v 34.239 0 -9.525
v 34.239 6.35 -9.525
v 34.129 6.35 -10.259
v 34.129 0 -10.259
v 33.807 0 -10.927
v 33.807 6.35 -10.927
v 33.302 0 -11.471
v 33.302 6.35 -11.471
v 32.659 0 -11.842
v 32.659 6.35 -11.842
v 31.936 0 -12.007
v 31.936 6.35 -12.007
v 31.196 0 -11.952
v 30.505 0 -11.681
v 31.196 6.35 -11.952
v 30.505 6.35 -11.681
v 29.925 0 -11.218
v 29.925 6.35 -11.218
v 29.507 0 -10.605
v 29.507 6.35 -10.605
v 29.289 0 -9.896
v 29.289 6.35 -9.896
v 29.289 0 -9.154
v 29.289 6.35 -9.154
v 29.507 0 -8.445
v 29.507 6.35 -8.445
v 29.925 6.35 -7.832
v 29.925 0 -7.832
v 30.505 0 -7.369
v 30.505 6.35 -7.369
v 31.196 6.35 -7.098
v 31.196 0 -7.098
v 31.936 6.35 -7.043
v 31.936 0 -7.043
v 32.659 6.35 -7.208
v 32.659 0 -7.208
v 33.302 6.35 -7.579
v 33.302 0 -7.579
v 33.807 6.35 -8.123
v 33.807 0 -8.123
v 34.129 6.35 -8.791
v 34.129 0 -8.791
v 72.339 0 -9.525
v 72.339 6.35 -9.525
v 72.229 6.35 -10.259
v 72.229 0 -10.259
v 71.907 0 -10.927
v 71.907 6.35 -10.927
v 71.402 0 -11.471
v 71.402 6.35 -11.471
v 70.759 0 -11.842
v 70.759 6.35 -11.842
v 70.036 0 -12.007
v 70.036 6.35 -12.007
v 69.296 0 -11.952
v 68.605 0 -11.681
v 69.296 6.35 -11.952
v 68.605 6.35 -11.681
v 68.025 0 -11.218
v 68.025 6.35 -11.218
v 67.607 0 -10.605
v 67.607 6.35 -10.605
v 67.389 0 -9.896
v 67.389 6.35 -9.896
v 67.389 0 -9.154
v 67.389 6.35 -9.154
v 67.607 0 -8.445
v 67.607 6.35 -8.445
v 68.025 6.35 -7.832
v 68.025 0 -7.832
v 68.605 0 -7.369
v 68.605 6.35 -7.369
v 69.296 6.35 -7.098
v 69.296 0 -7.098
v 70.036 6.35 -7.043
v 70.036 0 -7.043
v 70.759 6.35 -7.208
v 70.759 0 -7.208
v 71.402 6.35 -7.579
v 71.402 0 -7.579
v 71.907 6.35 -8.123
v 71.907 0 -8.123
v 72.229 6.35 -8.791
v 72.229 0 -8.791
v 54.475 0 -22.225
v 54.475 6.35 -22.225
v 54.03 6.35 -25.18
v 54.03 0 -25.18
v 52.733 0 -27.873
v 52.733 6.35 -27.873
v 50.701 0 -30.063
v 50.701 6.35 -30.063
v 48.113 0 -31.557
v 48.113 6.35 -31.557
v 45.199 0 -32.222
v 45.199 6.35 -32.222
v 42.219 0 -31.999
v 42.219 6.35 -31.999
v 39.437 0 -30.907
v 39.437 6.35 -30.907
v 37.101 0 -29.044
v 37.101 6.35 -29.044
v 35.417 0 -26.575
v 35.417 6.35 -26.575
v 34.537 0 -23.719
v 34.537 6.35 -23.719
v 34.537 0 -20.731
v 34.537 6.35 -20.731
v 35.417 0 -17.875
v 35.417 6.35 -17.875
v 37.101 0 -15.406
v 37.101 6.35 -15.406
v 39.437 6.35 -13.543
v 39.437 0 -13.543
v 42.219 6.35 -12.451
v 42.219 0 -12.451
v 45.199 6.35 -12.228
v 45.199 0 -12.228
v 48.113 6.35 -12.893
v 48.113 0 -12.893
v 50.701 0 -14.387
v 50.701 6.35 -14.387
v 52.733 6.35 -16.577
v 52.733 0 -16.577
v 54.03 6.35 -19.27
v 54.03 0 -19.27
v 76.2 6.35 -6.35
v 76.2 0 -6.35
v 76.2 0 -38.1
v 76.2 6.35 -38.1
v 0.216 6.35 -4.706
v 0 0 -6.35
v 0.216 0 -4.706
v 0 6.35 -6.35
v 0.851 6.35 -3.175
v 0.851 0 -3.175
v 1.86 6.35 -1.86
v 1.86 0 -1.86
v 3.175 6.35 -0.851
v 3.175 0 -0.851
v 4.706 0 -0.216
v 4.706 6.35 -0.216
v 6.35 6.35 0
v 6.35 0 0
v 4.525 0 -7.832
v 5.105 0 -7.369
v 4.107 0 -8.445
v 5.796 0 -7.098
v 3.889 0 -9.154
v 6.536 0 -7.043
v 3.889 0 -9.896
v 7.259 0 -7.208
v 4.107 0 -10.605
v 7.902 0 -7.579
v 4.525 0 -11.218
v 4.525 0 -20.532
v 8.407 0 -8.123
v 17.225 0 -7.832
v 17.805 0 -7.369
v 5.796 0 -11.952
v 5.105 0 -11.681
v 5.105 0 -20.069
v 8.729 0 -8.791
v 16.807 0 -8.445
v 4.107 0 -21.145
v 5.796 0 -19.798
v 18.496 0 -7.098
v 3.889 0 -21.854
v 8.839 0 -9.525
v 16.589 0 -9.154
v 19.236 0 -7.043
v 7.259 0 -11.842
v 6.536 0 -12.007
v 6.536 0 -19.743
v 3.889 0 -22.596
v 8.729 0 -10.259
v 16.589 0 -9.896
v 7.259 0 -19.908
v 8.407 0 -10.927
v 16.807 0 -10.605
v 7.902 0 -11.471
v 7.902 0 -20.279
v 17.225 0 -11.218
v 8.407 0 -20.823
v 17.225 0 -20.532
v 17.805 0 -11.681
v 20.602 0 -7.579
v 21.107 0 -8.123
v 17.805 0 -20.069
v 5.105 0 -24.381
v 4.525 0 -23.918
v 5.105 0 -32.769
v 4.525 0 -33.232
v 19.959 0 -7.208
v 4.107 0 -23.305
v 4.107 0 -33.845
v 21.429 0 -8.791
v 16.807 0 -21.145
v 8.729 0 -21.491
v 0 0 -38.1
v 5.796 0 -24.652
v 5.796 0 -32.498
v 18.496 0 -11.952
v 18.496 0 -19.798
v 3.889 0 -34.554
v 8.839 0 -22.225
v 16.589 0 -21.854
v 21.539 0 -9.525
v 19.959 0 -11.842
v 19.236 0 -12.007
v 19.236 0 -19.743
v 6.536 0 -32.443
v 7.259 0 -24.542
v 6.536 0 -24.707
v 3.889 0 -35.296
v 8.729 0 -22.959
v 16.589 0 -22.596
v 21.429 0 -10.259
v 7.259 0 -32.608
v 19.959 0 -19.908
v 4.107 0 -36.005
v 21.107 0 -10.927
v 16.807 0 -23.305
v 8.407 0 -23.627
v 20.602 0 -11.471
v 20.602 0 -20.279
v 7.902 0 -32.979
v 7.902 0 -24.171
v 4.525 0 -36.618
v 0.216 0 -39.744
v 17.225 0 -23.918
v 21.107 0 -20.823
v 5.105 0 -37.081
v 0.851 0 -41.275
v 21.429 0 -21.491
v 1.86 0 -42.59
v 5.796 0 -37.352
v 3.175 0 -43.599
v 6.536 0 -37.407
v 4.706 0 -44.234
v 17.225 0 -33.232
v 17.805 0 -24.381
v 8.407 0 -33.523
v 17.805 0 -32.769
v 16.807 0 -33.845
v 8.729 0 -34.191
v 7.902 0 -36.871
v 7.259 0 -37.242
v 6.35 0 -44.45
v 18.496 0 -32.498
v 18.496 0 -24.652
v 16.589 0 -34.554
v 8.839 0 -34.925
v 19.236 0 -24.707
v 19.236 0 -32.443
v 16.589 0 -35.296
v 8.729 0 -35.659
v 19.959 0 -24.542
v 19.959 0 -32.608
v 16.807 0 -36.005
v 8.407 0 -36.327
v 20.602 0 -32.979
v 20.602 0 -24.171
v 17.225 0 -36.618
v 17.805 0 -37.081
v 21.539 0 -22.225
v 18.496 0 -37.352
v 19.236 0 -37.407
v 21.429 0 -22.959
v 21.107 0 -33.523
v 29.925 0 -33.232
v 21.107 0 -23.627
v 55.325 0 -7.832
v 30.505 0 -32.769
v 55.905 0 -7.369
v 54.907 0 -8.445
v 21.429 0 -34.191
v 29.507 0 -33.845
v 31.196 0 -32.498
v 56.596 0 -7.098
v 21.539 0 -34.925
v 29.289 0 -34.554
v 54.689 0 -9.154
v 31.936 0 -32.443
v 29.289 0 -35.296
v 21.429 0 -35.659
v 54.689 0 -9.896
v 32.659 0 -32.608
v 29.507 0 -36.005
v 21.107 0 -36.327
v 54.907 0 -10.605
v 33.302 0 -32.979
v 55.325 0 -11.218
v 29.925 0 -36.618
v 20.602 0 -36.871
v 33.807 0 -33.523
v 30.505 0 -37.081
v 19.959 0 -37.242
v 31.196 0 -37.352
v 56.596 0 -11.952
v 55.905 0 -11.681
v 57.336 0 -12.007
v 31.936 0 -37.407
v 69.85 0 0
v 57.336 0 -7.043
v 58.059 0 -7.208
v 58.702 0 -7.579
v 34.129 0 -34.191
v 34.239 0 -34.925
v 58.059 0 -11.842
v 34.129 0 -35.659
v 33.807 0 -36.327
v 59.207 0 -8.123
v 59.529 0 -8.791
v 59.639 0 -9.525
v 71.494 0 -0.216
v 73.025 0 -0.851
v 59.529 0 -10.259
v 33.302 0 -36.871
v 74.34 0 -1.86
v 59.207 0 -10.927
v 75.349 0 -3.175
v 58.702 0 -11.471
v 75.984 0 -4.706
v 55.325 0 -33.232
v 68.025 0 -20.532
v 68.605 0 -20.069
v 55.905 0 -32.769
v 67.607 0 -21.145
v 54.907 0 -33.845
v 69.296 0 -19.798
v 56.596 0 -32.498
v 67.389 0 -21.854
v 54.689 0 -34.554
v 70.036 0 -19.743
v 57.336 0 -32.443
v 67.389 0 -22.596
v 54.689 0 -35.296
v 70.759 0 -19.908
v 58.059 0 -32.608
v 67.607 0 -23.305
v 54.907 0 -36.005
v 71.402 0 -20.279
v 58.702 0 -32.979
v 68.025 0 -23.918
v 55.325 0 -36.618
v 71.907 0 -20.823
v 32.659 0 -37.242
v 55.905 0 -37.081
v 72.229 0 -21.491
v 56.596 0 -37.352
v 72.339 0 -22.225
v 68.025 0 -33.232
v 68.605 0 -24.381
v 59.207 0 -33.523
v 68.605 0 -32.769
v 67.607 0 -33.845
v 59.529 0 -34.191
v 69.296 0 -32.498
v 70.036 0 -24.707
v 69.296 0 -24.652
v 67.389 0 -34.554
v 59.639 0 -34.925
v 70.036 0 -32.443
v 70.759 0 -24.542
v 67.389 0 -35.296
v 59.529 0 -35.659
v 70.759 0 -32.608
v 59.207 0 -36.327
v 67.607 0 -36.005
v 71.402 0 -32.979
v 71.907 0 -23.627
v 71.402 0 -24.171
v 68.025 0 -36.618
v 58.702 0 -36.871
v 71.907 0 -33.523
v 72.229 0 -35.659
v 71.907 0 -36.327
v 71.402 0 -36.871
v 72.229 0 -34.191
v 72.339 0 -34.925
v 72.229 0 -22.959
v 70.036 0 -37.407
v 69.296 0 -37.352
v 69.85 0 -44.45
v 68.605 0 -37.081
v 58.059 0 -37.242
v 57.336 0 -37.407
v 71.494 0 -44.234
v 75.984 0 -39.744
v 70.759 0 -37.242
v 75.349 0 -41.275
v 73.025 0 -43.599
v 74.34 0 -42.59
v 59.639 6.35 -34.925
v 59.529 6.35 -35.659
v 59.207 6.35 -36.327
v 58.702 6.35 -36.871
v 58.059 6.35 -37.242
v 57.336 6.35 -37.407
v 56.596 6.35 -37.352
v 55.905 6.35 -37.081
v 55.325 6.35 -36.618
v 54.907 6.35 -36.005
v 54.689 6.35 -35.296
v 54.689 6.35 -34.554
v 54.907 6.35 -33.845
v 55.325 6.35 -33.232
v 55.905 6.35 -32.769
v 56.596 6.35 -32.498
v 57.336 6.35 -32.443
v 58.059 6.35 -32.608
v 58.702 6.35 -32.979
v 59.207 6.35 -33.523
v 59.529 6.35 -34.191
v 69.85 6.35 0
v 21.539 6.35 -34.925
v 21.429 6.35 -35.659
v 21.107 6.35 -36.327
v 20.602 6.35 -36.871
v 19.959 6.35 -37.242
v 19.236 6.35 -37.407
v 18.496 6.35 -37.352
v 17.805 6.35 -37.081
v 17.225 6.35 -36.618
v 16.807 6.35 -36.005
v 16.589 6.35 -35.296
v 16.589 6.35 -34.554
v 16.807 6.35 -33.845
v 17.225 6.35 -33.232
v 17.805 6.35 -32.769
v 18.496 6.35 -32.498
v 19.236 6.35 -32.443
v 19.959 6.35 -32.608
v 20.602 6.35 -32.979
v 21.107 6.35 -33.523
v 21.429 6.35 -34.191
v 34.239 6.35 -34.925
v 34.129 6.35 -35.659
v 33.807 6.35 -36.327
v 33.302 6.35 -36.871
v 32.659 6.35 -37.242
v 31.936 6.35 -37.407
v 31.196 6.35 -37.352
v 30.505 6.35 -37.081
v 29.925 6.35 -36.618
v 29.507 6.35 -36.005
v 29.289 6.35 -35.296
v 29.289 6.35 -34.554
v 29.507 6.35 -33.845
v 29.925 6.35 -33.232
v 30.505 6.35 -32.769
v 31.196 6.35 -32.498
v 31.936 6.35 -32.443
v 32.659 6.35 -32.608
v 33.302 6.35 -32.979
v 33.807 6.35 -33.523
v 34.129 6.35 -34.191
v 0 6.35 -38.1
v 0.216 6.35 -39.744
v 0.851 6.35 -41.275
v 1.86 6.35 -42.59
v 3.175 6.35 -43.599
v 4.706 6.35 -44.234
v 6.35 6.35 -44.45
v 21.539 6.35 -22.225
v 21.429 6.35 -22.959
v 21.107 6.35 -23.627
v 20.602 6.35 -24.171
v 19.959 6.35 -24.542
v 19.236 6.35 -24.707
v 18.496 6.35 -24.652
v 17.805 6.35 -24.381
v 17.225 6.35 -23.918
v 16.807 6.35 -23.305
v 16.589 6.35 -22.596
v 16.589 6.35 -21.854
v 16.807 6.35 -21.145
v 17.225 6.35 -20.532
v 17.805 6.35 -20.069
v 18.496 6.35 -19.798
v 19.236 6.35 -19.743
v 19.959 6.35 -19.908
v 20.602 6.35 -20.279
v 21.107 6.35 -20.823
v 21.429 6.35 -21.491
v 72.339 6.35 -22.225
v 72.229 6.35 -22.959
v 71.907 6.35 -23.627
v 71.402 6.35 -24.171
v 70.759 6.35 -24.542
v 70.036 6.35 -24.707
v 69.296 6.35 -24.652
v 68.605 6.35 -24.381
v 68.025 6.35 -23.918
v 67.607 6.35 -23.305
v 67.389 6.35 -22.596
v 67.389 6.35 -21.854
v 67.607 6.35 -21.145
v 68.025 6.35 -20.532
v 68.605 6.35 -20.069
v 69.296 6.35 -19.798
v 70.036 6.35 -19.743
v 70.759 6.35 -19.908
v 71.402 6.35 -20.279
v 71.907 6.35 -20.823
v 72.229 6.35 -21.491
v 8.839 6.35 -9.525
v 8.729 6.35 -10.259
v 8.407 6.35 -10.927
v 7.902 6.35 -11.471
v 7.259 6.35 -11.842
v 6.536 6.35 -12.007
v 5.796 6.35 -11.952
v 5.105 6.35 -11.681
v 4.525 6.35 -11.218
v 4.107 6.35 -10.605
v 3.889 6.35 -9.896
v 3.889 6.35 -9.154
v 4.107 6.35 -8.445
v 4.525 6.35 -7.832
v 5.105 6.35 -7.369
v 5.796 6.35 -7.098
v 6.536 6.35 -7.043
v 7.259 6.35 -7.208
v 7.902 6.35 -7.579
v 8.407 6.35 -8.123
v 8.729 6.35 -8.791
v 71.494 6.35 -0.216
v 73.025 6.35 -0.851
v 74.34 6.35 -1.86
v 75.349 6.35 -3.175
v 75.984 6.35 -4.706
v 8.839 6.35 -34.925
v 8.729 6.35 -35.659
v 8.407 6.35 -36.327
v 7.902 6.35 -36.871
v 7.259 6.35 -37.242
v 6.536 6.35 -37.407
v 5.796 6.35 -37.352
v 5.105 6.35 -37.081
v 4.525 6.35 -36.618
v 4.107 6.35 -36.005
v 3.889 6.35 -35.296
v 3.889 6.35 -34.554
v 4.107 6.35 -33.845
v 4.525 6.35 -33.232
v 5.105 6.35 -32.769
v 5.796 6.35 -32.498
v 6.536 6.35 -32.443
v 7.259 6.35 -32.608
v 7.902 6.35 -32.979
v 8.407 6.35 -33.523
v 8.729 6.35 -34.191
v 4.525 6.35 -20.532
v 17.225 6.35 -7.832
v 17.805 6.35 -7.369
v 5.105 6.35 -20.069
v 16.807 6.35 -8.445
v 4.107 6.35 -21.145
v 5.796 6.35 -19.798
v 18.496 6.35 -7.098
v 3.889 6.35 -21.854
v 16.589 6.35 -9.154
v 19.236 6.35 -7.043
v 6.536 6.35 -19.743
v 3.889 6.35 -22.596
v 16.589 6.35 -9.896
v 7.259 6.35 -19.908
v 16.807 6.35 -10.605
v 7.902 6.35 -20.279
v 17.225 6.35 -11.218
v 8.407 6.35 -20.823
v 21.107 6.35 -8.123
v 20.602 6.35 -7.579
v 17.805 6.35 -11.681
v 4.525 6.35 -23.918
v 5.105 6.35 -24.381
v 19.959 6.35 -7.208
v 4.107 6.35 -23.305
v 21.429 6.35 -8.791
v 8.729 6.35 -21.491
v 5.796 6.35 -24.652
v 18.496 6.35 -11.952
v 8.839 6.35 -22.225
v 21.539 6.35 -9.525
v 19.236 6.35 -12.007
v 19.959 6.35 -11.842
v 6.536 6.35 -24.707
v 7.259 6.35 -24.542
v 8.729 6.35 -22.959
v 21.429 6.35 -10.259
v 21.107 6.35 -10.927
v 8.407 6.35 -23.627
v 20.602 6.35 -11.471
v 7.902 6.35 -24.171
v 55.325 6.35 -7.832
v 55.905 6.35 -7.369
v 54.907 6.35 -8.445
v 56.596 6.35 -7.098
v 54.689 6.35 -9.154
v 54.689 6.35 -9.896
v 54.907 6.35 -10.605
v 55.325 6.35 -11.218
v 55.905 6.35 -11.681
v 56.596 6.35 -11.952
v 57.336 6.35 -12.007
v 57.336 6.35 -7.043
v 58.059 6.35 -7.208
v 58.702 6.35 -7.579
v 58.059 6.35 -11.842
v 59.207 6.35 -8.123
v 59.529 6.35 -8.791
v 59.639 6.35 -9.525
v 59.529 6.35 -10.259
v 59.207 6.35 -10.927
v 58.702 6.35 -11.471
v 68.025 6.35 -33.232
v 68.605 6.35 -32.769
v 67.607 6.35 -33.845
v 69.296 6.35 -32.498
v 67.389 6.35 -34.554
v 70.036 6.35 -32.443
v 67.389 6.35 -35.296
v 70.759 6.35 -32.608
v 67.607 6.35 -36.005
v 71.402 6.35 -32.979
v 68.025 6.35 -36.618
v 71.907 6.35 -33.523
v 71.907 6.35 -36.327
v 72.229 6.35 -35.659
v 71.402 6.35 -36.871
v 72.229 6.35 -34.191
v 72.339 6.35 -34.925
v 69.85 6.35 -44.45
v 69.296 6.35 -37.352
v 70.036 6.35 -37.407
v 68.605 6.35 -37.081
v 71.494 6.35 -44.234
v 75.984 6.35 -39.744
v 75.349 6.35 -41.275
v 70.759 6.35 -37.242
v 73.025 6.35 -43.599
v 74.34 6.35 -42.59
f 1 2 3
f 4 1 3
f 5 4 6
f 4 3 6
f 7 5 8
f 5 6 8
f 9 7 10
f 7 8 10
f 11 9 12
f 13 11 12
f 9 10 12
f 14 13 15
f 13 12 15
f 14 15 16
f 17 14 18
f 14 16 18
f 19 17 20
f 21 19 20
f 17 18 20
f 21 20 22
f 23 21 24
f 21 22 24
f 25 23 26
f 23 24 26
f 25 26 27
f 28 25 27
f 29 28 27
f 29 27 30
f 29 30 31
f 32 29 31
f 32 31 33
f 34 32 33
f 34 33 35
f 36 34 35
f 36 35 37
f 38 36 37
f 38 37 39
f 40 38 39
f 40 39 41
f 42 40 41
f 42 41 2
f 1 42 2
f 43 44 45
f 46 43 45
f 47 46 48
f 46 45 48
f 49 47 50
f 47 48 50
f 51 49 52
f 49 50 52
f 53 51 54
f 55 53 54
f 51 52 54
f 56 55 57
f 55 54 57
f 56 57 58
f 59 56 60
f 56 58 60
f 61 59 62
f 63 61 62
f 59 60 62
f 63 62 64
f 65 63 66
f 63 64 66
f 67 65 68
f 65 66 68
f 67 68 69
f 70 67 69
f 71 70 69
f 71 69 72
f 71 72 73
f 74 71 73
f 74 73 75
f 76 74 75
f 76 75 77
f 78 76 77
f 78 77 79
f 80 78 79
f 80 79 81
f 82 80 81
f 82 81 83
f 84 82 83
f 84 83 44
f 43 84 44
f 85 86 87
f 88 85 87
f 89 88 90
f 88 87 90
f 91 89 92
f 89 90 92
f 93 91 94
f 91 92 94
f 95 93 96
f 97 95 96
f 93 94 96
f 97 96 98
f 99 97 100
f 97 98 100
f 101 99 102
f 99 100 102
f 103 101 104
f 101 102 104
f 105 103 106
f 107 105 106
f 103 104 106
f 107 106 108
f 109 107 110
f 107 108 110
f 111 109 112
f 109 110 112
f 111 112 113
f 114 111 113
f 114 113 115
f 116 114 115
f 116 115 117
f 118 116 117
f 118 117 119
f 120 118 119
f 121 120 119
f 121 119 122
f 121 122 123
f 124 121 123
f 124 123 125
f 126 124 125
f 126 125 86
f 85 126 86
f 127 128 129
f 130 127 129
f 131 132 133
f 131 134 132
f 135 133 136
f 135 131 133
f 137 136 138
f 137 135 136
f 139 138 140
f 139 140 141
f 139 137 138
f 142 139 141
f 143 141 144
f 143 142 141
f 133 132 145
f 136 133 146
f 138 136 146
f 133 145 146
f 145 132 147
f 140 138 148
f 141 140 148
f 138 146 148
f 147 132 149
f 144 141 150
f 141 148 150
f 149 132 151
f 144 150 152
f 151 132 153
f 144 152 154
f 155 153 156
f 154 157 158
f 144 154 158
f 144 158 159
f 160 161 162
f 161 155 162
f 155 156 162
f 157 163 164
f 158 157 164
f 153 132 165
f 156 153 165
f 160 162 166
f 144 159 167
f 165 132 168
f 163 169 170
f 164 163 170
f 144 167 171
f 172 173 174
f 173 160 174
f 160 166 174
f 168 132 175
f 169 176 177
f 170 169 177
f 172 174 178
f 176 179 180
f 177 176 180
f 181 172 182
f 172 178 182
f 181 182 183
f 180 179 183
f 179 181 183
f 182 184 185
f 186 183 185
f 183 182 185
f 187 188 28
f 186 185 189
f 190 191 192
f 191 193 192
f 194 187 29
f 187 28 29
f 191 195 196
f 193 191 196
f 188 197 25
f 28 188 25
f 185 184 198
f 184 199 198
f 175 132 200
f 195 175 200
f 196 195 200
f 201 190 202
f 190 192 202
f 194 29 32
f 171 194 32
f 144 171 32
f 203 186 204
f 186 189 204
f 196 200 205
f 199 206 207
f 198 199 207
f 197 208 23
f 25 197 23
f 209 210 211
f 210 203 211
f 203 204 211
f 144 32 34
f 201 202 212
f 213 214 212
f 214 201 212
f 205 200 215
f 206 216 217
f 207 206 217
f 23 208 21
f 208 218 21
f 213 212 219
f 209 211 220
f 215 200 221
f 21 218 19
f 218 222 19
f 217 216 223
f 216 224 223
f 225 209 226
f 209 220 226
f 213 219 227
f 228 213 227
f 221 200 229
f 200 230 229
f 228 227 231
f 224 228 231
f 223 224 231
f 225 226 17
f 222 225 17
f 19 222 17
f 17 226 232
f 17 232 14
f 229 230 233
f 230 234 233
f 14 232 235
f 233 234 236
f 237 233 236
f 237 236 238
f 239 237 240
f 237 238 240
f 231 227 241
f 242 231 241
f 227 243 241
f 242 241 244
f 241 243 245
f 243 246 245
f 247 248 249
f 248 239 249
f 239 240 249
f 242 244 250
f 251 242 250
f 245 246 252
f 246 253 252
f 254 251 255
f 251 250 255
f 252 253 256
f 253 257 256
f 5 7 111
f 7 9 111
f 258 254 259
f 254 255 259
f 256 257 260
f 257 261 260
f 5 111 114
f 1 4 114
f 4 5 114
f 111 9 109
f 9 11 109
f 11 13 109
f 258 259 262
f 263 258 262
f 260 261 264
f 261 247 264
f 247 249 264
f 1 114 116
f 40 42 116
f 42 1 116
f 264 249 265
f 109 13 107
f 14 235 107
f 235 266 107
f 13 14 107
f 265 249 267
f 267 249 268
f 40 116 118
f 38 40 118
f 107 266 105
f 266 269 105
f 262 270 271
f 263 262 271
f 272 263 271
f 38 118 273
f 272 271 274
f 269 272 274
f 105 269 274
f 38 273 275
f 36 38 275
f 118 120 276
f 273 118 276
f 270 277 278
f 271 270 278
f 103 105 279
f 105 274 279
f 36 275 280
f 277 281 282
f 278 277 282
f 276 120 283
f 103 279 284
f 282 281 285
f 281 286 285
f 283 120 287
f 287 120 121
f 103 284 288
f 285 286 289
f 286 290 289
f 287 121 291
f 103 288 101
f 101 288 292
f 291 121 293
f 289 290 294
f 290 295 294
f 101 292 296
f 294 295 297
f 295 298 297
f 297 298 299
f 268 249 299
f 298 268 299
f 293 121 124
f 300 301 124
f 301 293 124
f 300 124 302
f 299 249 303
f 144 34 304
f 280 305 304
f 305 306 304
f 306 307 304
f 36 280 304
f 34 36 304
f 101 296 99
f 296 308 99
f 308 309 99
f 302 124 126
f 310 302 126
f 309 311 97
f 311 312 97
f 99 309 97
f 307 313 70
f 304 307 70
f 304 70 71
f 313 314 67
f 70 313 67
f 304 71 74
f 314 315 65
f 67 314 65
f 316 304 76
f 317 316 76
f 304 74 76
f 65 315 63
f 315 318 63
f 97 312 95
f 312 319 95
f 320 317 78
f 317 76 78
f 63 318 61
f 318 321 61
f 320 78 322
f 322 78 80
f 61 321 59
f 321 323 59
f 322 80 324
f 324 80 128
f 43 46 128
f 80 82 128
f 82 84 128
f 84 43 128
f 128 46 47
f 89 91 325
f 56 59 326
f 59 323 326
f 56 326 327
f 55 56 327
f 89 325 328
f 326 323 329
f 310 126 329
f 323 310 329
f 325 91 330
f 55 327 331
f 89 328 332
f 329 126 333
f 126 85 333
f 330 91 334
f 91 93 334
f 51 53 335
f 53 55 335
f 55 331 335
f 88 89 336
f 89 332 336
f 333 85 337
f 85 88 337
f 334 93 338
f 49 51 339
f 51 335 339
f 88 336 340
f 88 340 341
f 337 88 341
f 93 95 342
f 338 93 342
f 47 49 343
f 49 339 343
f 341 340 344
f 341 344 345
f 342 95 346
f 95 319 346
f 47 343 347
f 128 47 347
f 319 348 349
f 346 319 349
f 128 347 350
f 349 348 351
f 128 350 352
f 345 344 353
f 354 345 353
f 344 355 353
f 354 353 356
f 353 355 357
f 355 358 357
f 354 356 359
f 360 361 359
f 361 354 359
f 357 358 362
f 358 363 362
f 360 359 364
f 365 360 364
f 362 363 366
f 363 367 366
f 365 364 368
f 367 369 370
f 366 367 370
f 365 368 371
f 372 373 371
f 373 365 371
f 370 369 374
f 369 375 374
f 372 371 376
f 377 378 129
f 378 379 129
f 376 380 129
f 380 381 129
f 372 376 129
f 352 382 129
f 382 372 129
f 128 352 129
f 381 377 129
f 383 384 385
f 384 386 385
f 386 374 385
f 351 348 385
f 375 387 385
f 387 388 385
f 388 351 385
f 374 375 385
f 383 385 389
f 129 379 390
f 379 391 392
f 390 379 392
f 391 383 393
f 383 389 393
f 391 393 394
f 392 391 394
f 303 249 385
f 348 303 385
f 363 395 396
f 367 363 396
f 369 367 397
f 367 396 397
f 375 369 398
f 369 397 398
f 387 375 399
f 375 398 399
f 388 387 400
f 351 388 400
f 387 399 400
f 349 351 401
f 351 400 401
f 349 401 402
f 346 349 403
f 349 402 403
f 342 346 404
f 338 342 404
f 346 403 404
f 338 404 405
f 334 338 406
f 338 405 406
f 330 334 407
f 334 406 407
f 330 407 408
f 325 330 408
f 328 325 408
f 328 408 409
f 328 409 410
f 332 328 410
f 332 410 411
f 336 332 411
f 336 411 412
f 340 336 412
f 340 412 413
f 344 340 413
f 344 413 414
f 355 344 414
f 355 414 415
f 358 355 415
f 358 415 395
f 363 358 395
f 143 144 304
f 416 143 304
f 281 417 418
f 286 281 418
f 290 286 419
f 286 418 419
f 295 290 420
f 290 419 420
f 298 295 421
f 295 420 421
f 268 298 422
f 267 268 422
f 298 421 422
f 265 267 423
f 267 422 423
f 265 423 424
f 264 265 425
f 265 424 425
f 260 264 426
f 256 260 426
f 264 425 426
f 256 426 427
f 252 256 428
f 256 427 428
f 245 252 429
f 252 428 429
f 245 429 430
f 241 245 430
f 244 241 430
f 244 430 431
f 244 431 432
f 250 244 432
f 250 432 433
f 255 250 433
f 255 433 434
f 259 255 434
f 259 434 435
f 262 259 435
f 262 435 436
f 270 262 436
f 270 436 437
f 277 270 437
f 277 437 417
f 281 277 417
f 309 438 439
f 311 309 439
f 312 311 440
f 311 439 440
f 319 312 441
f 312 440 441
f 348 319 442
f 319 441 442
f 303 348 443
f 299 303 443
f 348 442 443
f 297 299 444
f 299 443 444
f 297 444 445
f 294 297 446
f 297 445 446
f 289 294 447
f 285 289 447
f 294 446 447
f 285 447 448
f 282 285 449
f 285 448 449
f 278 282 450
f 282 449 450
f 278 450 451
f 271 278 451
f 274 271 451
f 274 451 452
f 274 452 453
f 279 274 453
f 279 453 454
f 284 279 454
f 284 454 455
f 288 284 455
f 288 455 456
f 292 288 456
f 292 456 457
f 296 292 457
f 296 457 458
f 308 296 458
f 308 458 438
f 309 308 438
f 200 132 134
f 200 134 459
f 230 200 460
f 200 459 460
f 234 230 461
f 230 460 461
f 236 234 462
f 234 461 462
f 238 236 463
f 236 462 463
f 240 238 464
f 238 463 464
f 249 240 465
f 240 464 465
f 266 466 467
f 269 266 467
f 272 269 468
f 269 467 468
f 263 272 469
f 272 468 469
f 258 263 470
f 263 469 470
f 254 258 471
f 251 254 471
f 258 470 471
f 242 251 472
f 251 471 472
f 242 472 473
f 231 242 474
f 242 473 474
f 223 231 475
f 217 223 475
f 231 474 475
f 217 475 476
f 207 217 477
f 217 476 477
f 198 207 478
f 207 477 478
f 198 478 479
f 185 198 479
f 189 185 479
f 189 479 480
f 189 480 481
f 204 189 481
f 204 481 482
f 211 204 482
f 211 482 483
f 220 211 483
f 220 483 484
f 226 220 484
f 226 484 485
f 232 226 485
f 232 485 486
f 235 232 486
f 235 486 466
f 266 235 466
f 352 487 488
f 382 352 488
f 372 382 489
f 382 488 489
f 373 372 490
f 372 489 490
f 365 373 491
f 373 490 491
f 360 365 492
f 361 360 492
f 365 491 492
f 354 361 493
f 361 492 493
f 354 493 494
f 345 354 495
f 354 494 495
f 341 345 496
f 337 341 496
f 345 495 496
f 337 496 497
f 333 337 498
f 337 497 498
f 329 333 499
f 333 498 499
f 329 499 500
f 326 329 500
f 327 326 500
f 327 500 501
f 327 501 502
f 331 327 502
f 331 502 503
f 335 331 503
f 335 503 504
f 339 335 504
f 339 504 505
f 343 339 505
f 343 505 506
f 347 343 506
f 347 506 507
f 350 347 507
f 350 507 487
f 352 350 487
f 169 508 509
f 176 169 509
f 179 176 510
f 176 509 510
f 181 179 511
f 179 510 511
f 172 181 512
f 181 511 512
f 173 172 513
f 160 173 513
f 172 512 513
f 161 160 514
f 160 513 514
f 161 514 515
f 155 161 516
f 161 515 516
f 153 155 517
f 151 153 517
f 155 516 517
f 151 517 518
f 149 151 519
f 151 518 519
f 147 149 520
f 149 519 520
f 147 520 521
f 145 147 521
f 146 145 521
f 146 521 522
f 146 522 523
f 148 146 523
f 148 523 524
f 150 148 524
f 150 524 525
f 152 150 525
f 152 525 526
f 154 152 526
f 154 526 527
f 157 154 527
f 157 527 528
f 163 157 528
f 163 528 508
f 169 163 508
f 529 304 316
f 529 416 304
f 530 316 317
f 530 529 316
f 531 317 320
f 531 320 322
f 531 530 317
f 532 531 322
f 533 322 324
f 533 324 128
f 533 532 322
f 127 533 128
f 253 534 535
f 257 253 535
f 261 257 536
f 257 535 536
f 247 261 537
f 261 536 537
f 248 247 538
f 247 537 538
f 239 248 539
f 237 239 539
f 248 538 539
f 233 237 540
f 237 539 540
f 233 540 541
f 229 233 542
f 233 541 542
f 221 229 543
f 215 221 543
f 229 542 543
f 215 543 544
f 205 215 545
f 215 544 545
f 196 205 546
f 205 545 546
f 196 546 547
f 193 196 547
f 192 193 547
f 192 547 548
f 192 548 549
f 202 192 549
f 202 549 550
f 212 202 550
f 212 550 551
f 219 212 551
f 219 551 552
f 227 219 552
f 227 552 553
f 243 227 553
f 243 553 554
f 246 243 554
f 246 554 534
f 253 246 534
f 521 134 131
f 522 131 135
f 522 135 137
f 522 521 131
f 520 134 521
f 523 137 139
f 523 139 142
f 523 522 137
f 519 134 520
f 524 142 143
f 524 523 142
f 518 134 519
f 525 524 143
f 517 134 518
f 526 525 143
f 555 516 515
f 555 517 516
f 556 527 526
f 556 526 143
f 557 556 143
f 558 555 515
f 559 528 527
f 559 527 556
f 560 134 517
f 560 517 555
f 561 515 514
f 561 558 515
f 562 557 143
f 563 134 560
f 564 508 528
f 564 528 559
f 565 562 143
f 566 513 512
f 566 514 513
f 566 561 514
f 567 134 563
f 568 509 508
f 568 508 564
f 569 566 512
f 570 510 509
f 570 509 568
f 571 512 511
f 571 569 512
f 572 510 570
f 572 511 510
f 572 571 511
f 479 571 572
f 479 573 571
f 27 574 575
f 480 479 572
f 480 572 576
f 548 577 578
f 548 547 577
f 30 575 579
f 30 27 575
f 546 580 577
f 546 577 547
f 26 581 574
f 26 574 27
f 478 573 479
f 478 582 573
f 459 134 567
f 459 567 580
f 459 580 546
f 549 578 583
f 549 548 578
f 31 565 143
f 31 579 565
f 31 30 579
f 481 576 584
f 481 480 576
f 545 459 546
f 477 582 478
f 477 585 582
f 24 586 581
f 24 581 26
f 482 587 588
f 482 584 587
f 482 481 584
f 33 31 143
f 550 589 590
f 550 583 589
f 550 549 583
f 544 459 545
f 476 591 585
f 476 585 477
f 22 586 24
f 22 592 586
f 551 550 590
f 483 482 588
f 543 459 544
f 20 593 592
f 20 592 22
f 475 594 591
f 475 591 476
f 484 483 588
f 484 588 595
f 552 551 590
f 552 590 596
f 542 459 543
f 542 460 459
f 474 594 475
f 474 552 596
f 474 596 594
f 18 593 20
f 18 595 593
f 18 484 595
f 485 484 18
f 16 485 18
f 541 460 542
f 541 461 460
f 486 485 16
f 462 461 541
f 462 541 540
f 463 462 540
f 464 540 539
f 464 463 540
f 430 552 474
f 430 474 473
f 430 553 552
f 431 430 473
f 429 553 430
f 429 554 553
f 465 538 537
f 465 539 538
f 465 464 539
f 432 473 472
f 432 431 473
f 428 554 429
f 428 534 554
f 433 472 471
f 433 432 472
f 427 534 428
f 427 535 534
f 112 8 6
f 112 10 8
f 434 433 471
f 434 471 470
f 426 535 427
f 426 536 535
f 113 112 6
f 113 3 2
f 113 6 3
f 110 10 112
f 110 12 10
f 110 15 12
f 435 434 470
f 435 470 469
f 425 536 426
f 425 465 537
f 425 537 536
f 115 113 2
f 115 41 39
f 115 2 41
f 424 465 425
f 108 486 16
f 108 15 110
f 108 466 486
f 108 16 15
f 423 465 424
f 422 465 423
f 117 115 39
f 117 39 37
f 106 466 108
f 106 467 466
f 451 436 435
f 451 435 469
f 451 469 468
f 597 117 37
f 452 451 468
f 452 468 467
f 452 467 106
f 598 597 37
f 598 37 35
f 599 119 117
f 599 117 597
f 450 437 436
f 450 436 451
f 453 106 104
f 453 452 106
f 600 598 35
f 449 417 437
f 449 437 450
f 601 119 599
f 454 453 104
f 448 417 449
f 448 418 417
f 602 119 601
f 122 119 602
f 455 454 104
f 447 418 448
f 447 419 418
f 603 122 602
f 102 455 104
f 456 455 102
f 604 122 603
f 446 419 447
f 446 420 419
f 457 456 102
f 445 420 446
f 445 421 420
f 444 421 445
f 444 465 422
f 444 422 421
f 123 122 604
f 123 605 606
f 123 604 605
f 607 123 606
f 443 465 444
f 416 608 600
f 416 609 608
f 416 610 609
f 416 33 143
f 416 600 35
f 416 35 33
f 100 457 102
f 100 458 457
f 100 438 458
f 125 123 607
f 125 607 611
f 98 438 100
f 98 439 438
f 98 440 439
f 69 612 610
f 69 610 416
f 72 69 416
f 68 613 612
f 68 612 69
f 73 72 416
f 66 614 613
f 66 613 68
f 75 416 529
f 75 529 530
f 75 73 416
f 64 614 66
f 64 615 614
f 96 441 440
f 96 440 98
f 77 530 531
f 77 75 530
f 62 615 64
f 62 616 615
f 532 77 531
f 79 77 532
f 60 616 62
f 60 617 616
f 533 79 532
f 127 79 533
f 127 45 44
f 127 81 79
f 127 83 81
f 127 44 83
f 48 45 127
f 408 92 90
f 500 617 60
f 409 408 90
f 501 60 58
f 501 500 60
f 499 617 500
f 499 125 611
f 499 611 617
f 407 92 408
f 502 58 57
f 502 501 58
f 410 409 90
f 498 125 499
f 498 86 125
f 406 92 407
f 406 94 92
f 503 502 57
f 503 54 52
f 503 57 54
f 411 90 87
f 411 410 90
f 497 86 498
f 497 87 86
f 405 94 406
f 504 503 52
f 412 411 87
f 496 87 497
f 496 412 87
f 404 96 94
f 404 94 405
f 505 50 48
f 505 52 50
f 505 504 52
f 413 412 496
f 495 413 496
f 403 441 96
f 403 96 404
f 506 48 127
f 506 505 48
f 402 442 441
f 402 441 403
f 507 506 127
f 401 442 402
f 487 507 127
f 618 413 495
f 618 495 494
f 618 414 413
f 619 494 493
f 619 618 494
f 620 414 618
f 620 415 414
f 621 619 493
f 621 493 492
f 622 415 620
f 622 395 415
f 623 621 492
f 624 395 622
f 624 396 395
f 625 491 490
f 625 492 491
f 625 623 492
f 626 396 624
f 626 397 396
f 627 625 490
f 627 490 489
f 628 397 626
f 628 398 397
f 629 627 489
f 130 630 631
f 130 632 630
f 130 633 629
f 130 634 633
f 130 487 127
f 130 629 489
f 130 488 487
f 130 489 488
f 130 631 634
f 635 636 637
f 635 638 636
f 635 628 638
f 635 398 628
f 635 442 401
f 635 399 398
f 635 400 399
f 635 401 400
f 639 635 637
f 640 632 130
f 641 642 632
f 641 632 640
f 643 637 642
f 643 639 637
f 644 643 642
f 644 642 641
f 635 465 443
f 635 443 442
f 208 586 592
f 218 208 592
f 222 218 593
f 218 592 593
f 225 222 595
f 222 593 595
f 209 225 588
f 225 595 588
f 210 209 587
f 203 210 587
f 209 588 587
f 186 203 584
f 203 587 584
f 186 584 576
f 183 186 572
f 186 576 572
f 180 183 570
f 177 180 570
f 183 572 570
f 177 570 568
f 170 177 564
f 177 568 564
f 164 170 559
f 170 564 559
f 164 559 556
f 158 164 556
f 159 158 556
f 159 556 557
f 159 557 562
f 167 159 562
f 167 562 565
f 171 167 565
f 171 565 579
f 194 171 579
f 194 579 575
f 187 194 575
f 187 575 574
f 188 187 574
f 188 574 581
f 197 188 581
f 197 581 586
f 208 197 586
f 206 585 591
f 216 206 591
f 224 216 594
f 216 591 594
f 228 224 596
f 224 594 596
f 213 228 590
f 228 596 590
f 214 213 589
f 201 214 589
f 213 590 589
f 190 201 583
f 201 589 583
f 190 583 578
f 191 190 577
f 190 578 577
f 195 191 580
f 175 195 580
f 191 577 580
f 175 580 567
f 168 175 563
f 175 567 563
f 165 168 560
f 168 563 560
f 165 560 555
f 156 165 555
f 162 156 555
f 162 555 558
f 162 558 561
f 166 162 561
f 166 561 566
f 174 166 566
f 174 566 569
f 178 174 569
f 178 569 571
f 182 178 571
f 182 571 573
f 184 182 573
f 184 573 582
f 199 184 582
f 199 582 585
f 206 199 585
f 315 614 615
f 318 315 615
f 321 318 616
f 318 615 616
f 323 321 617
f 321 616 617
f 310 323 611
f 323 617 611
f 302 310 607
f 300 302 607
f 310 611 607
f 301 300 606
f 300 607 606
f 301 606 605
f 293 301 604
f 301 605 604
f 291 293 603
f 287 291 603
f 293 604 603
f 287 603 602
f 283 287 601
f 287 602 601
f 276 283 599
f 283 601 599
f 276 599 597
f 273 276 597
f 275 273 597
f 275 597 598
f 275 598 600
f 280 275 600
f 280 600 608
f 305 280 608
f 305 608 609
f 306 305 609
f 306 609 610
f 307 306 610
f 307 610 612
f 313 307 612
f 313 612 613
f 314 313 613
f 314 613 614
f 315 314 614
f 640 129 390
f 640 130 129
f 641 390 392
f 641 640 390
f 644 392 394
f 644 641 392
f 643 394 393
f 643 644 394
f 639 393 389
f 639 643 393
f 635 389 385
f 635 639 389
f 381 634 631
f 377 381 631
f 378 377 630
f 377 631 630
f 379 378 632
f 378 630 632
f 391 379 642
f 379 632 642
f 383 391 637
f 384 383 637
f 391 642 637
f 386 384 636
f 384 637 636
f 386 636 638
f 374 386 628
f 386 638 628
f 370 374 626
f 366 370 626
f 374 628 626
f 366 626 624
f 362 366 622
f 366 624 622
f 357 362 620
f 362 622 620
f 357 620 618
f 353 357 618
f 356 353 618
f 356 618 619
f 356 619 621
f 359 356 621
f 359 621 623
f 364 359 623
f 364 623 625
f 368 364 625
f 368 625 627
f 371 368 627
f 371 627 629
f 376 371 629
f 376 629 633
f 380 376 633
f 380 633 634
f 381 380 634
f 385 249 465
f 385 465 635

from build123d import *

# Parameters (mm, degrees)
SKETCH1_W           = 76.2
SKETCH1_H           = 44.45
BOSS_EXTRUDE1_DEPTH = 6.35
FILLET1_R           = 6.35
SKETCH2_R           = 2.4892
SKETCH2_R_2         = 10.025399939
CUT_EXTRUDE1_DEPTH  = 7.35


with BuildPart() as part:
    # Sketch1 → Boss-Extrude1 (new body)
    with BuildSketch(Plane(origin=(0, 0, 0), x_dir=(1, 0, 0), z_dir=(0, 1, 0))):
        with Locations((38.1, 22.225)):
            Rectangle(SKETCH1_W, SKETCH1_H)
    extrude(amount=BOSS_EXTRUDE1_DEPTH)

    # Fillet1
    fillet1_edges = [part.edges().sort_by_distance(p)[0] for p in [
        (0, 3.175, -44.45),
        (76.2, 3.175, -44.45),
        (76.2, 3.175, 0),
        (0, 3.175, 0),
    ]]
    fillet(fillet1_edges, radius=FILLET1_R)

    # Sketch2 → Cut-Extrude1 (cut, through all)
    with BuildSketch(Plane(origin=(0, 6.35, 0), x_dir=(1, 0, 0), z_dir=(0, 1, 0))):
        with Locations((31.75, 34.925)):
            Circle(SKETCH2_R)
        with Locations((6.35, 34.925)):
            Circle(SKETCH2_R)
        with Locations((19.05, 34.925)):
            Circle(SKETCH2_R)
        with Locations((19.05, 22.225)):
            Circle(SKETCH2_R)
        with Locations((6.35, 22.225)):
            Circle(SKETCH2_R)
        with Locations((6.35, 9.525)):
            Circle(SKETCH2_R)
        with Locations((19.05, 9.525)):
            Circle(SKETCH2_R)
        with Locations((31.75, 9.525)):
            Circle(SKETCH2_R)
        with Locations((57.15, 9.525)):
            Circle(SKETCH2_R)
        with Locations((69.85, 9.525)):
            Circle(SKETCH2_R)
        with Locations((69.85, 22.225)):
            Circle(SKETCH2_R)
        with Locations((69.85, 34.925)):
            Circle(SKETCH2_R)
        with Locations((57.15, 34.925)):
            Circle(SKETCH2_R)
        with Locations((44.45, 22.225)):
            Circle(SKETCH2_R_2)
    extrude(amount=-CUT_EXTRUDE1_DEPTH, mode=Mode.SUBTRACT)


solid = part.part
